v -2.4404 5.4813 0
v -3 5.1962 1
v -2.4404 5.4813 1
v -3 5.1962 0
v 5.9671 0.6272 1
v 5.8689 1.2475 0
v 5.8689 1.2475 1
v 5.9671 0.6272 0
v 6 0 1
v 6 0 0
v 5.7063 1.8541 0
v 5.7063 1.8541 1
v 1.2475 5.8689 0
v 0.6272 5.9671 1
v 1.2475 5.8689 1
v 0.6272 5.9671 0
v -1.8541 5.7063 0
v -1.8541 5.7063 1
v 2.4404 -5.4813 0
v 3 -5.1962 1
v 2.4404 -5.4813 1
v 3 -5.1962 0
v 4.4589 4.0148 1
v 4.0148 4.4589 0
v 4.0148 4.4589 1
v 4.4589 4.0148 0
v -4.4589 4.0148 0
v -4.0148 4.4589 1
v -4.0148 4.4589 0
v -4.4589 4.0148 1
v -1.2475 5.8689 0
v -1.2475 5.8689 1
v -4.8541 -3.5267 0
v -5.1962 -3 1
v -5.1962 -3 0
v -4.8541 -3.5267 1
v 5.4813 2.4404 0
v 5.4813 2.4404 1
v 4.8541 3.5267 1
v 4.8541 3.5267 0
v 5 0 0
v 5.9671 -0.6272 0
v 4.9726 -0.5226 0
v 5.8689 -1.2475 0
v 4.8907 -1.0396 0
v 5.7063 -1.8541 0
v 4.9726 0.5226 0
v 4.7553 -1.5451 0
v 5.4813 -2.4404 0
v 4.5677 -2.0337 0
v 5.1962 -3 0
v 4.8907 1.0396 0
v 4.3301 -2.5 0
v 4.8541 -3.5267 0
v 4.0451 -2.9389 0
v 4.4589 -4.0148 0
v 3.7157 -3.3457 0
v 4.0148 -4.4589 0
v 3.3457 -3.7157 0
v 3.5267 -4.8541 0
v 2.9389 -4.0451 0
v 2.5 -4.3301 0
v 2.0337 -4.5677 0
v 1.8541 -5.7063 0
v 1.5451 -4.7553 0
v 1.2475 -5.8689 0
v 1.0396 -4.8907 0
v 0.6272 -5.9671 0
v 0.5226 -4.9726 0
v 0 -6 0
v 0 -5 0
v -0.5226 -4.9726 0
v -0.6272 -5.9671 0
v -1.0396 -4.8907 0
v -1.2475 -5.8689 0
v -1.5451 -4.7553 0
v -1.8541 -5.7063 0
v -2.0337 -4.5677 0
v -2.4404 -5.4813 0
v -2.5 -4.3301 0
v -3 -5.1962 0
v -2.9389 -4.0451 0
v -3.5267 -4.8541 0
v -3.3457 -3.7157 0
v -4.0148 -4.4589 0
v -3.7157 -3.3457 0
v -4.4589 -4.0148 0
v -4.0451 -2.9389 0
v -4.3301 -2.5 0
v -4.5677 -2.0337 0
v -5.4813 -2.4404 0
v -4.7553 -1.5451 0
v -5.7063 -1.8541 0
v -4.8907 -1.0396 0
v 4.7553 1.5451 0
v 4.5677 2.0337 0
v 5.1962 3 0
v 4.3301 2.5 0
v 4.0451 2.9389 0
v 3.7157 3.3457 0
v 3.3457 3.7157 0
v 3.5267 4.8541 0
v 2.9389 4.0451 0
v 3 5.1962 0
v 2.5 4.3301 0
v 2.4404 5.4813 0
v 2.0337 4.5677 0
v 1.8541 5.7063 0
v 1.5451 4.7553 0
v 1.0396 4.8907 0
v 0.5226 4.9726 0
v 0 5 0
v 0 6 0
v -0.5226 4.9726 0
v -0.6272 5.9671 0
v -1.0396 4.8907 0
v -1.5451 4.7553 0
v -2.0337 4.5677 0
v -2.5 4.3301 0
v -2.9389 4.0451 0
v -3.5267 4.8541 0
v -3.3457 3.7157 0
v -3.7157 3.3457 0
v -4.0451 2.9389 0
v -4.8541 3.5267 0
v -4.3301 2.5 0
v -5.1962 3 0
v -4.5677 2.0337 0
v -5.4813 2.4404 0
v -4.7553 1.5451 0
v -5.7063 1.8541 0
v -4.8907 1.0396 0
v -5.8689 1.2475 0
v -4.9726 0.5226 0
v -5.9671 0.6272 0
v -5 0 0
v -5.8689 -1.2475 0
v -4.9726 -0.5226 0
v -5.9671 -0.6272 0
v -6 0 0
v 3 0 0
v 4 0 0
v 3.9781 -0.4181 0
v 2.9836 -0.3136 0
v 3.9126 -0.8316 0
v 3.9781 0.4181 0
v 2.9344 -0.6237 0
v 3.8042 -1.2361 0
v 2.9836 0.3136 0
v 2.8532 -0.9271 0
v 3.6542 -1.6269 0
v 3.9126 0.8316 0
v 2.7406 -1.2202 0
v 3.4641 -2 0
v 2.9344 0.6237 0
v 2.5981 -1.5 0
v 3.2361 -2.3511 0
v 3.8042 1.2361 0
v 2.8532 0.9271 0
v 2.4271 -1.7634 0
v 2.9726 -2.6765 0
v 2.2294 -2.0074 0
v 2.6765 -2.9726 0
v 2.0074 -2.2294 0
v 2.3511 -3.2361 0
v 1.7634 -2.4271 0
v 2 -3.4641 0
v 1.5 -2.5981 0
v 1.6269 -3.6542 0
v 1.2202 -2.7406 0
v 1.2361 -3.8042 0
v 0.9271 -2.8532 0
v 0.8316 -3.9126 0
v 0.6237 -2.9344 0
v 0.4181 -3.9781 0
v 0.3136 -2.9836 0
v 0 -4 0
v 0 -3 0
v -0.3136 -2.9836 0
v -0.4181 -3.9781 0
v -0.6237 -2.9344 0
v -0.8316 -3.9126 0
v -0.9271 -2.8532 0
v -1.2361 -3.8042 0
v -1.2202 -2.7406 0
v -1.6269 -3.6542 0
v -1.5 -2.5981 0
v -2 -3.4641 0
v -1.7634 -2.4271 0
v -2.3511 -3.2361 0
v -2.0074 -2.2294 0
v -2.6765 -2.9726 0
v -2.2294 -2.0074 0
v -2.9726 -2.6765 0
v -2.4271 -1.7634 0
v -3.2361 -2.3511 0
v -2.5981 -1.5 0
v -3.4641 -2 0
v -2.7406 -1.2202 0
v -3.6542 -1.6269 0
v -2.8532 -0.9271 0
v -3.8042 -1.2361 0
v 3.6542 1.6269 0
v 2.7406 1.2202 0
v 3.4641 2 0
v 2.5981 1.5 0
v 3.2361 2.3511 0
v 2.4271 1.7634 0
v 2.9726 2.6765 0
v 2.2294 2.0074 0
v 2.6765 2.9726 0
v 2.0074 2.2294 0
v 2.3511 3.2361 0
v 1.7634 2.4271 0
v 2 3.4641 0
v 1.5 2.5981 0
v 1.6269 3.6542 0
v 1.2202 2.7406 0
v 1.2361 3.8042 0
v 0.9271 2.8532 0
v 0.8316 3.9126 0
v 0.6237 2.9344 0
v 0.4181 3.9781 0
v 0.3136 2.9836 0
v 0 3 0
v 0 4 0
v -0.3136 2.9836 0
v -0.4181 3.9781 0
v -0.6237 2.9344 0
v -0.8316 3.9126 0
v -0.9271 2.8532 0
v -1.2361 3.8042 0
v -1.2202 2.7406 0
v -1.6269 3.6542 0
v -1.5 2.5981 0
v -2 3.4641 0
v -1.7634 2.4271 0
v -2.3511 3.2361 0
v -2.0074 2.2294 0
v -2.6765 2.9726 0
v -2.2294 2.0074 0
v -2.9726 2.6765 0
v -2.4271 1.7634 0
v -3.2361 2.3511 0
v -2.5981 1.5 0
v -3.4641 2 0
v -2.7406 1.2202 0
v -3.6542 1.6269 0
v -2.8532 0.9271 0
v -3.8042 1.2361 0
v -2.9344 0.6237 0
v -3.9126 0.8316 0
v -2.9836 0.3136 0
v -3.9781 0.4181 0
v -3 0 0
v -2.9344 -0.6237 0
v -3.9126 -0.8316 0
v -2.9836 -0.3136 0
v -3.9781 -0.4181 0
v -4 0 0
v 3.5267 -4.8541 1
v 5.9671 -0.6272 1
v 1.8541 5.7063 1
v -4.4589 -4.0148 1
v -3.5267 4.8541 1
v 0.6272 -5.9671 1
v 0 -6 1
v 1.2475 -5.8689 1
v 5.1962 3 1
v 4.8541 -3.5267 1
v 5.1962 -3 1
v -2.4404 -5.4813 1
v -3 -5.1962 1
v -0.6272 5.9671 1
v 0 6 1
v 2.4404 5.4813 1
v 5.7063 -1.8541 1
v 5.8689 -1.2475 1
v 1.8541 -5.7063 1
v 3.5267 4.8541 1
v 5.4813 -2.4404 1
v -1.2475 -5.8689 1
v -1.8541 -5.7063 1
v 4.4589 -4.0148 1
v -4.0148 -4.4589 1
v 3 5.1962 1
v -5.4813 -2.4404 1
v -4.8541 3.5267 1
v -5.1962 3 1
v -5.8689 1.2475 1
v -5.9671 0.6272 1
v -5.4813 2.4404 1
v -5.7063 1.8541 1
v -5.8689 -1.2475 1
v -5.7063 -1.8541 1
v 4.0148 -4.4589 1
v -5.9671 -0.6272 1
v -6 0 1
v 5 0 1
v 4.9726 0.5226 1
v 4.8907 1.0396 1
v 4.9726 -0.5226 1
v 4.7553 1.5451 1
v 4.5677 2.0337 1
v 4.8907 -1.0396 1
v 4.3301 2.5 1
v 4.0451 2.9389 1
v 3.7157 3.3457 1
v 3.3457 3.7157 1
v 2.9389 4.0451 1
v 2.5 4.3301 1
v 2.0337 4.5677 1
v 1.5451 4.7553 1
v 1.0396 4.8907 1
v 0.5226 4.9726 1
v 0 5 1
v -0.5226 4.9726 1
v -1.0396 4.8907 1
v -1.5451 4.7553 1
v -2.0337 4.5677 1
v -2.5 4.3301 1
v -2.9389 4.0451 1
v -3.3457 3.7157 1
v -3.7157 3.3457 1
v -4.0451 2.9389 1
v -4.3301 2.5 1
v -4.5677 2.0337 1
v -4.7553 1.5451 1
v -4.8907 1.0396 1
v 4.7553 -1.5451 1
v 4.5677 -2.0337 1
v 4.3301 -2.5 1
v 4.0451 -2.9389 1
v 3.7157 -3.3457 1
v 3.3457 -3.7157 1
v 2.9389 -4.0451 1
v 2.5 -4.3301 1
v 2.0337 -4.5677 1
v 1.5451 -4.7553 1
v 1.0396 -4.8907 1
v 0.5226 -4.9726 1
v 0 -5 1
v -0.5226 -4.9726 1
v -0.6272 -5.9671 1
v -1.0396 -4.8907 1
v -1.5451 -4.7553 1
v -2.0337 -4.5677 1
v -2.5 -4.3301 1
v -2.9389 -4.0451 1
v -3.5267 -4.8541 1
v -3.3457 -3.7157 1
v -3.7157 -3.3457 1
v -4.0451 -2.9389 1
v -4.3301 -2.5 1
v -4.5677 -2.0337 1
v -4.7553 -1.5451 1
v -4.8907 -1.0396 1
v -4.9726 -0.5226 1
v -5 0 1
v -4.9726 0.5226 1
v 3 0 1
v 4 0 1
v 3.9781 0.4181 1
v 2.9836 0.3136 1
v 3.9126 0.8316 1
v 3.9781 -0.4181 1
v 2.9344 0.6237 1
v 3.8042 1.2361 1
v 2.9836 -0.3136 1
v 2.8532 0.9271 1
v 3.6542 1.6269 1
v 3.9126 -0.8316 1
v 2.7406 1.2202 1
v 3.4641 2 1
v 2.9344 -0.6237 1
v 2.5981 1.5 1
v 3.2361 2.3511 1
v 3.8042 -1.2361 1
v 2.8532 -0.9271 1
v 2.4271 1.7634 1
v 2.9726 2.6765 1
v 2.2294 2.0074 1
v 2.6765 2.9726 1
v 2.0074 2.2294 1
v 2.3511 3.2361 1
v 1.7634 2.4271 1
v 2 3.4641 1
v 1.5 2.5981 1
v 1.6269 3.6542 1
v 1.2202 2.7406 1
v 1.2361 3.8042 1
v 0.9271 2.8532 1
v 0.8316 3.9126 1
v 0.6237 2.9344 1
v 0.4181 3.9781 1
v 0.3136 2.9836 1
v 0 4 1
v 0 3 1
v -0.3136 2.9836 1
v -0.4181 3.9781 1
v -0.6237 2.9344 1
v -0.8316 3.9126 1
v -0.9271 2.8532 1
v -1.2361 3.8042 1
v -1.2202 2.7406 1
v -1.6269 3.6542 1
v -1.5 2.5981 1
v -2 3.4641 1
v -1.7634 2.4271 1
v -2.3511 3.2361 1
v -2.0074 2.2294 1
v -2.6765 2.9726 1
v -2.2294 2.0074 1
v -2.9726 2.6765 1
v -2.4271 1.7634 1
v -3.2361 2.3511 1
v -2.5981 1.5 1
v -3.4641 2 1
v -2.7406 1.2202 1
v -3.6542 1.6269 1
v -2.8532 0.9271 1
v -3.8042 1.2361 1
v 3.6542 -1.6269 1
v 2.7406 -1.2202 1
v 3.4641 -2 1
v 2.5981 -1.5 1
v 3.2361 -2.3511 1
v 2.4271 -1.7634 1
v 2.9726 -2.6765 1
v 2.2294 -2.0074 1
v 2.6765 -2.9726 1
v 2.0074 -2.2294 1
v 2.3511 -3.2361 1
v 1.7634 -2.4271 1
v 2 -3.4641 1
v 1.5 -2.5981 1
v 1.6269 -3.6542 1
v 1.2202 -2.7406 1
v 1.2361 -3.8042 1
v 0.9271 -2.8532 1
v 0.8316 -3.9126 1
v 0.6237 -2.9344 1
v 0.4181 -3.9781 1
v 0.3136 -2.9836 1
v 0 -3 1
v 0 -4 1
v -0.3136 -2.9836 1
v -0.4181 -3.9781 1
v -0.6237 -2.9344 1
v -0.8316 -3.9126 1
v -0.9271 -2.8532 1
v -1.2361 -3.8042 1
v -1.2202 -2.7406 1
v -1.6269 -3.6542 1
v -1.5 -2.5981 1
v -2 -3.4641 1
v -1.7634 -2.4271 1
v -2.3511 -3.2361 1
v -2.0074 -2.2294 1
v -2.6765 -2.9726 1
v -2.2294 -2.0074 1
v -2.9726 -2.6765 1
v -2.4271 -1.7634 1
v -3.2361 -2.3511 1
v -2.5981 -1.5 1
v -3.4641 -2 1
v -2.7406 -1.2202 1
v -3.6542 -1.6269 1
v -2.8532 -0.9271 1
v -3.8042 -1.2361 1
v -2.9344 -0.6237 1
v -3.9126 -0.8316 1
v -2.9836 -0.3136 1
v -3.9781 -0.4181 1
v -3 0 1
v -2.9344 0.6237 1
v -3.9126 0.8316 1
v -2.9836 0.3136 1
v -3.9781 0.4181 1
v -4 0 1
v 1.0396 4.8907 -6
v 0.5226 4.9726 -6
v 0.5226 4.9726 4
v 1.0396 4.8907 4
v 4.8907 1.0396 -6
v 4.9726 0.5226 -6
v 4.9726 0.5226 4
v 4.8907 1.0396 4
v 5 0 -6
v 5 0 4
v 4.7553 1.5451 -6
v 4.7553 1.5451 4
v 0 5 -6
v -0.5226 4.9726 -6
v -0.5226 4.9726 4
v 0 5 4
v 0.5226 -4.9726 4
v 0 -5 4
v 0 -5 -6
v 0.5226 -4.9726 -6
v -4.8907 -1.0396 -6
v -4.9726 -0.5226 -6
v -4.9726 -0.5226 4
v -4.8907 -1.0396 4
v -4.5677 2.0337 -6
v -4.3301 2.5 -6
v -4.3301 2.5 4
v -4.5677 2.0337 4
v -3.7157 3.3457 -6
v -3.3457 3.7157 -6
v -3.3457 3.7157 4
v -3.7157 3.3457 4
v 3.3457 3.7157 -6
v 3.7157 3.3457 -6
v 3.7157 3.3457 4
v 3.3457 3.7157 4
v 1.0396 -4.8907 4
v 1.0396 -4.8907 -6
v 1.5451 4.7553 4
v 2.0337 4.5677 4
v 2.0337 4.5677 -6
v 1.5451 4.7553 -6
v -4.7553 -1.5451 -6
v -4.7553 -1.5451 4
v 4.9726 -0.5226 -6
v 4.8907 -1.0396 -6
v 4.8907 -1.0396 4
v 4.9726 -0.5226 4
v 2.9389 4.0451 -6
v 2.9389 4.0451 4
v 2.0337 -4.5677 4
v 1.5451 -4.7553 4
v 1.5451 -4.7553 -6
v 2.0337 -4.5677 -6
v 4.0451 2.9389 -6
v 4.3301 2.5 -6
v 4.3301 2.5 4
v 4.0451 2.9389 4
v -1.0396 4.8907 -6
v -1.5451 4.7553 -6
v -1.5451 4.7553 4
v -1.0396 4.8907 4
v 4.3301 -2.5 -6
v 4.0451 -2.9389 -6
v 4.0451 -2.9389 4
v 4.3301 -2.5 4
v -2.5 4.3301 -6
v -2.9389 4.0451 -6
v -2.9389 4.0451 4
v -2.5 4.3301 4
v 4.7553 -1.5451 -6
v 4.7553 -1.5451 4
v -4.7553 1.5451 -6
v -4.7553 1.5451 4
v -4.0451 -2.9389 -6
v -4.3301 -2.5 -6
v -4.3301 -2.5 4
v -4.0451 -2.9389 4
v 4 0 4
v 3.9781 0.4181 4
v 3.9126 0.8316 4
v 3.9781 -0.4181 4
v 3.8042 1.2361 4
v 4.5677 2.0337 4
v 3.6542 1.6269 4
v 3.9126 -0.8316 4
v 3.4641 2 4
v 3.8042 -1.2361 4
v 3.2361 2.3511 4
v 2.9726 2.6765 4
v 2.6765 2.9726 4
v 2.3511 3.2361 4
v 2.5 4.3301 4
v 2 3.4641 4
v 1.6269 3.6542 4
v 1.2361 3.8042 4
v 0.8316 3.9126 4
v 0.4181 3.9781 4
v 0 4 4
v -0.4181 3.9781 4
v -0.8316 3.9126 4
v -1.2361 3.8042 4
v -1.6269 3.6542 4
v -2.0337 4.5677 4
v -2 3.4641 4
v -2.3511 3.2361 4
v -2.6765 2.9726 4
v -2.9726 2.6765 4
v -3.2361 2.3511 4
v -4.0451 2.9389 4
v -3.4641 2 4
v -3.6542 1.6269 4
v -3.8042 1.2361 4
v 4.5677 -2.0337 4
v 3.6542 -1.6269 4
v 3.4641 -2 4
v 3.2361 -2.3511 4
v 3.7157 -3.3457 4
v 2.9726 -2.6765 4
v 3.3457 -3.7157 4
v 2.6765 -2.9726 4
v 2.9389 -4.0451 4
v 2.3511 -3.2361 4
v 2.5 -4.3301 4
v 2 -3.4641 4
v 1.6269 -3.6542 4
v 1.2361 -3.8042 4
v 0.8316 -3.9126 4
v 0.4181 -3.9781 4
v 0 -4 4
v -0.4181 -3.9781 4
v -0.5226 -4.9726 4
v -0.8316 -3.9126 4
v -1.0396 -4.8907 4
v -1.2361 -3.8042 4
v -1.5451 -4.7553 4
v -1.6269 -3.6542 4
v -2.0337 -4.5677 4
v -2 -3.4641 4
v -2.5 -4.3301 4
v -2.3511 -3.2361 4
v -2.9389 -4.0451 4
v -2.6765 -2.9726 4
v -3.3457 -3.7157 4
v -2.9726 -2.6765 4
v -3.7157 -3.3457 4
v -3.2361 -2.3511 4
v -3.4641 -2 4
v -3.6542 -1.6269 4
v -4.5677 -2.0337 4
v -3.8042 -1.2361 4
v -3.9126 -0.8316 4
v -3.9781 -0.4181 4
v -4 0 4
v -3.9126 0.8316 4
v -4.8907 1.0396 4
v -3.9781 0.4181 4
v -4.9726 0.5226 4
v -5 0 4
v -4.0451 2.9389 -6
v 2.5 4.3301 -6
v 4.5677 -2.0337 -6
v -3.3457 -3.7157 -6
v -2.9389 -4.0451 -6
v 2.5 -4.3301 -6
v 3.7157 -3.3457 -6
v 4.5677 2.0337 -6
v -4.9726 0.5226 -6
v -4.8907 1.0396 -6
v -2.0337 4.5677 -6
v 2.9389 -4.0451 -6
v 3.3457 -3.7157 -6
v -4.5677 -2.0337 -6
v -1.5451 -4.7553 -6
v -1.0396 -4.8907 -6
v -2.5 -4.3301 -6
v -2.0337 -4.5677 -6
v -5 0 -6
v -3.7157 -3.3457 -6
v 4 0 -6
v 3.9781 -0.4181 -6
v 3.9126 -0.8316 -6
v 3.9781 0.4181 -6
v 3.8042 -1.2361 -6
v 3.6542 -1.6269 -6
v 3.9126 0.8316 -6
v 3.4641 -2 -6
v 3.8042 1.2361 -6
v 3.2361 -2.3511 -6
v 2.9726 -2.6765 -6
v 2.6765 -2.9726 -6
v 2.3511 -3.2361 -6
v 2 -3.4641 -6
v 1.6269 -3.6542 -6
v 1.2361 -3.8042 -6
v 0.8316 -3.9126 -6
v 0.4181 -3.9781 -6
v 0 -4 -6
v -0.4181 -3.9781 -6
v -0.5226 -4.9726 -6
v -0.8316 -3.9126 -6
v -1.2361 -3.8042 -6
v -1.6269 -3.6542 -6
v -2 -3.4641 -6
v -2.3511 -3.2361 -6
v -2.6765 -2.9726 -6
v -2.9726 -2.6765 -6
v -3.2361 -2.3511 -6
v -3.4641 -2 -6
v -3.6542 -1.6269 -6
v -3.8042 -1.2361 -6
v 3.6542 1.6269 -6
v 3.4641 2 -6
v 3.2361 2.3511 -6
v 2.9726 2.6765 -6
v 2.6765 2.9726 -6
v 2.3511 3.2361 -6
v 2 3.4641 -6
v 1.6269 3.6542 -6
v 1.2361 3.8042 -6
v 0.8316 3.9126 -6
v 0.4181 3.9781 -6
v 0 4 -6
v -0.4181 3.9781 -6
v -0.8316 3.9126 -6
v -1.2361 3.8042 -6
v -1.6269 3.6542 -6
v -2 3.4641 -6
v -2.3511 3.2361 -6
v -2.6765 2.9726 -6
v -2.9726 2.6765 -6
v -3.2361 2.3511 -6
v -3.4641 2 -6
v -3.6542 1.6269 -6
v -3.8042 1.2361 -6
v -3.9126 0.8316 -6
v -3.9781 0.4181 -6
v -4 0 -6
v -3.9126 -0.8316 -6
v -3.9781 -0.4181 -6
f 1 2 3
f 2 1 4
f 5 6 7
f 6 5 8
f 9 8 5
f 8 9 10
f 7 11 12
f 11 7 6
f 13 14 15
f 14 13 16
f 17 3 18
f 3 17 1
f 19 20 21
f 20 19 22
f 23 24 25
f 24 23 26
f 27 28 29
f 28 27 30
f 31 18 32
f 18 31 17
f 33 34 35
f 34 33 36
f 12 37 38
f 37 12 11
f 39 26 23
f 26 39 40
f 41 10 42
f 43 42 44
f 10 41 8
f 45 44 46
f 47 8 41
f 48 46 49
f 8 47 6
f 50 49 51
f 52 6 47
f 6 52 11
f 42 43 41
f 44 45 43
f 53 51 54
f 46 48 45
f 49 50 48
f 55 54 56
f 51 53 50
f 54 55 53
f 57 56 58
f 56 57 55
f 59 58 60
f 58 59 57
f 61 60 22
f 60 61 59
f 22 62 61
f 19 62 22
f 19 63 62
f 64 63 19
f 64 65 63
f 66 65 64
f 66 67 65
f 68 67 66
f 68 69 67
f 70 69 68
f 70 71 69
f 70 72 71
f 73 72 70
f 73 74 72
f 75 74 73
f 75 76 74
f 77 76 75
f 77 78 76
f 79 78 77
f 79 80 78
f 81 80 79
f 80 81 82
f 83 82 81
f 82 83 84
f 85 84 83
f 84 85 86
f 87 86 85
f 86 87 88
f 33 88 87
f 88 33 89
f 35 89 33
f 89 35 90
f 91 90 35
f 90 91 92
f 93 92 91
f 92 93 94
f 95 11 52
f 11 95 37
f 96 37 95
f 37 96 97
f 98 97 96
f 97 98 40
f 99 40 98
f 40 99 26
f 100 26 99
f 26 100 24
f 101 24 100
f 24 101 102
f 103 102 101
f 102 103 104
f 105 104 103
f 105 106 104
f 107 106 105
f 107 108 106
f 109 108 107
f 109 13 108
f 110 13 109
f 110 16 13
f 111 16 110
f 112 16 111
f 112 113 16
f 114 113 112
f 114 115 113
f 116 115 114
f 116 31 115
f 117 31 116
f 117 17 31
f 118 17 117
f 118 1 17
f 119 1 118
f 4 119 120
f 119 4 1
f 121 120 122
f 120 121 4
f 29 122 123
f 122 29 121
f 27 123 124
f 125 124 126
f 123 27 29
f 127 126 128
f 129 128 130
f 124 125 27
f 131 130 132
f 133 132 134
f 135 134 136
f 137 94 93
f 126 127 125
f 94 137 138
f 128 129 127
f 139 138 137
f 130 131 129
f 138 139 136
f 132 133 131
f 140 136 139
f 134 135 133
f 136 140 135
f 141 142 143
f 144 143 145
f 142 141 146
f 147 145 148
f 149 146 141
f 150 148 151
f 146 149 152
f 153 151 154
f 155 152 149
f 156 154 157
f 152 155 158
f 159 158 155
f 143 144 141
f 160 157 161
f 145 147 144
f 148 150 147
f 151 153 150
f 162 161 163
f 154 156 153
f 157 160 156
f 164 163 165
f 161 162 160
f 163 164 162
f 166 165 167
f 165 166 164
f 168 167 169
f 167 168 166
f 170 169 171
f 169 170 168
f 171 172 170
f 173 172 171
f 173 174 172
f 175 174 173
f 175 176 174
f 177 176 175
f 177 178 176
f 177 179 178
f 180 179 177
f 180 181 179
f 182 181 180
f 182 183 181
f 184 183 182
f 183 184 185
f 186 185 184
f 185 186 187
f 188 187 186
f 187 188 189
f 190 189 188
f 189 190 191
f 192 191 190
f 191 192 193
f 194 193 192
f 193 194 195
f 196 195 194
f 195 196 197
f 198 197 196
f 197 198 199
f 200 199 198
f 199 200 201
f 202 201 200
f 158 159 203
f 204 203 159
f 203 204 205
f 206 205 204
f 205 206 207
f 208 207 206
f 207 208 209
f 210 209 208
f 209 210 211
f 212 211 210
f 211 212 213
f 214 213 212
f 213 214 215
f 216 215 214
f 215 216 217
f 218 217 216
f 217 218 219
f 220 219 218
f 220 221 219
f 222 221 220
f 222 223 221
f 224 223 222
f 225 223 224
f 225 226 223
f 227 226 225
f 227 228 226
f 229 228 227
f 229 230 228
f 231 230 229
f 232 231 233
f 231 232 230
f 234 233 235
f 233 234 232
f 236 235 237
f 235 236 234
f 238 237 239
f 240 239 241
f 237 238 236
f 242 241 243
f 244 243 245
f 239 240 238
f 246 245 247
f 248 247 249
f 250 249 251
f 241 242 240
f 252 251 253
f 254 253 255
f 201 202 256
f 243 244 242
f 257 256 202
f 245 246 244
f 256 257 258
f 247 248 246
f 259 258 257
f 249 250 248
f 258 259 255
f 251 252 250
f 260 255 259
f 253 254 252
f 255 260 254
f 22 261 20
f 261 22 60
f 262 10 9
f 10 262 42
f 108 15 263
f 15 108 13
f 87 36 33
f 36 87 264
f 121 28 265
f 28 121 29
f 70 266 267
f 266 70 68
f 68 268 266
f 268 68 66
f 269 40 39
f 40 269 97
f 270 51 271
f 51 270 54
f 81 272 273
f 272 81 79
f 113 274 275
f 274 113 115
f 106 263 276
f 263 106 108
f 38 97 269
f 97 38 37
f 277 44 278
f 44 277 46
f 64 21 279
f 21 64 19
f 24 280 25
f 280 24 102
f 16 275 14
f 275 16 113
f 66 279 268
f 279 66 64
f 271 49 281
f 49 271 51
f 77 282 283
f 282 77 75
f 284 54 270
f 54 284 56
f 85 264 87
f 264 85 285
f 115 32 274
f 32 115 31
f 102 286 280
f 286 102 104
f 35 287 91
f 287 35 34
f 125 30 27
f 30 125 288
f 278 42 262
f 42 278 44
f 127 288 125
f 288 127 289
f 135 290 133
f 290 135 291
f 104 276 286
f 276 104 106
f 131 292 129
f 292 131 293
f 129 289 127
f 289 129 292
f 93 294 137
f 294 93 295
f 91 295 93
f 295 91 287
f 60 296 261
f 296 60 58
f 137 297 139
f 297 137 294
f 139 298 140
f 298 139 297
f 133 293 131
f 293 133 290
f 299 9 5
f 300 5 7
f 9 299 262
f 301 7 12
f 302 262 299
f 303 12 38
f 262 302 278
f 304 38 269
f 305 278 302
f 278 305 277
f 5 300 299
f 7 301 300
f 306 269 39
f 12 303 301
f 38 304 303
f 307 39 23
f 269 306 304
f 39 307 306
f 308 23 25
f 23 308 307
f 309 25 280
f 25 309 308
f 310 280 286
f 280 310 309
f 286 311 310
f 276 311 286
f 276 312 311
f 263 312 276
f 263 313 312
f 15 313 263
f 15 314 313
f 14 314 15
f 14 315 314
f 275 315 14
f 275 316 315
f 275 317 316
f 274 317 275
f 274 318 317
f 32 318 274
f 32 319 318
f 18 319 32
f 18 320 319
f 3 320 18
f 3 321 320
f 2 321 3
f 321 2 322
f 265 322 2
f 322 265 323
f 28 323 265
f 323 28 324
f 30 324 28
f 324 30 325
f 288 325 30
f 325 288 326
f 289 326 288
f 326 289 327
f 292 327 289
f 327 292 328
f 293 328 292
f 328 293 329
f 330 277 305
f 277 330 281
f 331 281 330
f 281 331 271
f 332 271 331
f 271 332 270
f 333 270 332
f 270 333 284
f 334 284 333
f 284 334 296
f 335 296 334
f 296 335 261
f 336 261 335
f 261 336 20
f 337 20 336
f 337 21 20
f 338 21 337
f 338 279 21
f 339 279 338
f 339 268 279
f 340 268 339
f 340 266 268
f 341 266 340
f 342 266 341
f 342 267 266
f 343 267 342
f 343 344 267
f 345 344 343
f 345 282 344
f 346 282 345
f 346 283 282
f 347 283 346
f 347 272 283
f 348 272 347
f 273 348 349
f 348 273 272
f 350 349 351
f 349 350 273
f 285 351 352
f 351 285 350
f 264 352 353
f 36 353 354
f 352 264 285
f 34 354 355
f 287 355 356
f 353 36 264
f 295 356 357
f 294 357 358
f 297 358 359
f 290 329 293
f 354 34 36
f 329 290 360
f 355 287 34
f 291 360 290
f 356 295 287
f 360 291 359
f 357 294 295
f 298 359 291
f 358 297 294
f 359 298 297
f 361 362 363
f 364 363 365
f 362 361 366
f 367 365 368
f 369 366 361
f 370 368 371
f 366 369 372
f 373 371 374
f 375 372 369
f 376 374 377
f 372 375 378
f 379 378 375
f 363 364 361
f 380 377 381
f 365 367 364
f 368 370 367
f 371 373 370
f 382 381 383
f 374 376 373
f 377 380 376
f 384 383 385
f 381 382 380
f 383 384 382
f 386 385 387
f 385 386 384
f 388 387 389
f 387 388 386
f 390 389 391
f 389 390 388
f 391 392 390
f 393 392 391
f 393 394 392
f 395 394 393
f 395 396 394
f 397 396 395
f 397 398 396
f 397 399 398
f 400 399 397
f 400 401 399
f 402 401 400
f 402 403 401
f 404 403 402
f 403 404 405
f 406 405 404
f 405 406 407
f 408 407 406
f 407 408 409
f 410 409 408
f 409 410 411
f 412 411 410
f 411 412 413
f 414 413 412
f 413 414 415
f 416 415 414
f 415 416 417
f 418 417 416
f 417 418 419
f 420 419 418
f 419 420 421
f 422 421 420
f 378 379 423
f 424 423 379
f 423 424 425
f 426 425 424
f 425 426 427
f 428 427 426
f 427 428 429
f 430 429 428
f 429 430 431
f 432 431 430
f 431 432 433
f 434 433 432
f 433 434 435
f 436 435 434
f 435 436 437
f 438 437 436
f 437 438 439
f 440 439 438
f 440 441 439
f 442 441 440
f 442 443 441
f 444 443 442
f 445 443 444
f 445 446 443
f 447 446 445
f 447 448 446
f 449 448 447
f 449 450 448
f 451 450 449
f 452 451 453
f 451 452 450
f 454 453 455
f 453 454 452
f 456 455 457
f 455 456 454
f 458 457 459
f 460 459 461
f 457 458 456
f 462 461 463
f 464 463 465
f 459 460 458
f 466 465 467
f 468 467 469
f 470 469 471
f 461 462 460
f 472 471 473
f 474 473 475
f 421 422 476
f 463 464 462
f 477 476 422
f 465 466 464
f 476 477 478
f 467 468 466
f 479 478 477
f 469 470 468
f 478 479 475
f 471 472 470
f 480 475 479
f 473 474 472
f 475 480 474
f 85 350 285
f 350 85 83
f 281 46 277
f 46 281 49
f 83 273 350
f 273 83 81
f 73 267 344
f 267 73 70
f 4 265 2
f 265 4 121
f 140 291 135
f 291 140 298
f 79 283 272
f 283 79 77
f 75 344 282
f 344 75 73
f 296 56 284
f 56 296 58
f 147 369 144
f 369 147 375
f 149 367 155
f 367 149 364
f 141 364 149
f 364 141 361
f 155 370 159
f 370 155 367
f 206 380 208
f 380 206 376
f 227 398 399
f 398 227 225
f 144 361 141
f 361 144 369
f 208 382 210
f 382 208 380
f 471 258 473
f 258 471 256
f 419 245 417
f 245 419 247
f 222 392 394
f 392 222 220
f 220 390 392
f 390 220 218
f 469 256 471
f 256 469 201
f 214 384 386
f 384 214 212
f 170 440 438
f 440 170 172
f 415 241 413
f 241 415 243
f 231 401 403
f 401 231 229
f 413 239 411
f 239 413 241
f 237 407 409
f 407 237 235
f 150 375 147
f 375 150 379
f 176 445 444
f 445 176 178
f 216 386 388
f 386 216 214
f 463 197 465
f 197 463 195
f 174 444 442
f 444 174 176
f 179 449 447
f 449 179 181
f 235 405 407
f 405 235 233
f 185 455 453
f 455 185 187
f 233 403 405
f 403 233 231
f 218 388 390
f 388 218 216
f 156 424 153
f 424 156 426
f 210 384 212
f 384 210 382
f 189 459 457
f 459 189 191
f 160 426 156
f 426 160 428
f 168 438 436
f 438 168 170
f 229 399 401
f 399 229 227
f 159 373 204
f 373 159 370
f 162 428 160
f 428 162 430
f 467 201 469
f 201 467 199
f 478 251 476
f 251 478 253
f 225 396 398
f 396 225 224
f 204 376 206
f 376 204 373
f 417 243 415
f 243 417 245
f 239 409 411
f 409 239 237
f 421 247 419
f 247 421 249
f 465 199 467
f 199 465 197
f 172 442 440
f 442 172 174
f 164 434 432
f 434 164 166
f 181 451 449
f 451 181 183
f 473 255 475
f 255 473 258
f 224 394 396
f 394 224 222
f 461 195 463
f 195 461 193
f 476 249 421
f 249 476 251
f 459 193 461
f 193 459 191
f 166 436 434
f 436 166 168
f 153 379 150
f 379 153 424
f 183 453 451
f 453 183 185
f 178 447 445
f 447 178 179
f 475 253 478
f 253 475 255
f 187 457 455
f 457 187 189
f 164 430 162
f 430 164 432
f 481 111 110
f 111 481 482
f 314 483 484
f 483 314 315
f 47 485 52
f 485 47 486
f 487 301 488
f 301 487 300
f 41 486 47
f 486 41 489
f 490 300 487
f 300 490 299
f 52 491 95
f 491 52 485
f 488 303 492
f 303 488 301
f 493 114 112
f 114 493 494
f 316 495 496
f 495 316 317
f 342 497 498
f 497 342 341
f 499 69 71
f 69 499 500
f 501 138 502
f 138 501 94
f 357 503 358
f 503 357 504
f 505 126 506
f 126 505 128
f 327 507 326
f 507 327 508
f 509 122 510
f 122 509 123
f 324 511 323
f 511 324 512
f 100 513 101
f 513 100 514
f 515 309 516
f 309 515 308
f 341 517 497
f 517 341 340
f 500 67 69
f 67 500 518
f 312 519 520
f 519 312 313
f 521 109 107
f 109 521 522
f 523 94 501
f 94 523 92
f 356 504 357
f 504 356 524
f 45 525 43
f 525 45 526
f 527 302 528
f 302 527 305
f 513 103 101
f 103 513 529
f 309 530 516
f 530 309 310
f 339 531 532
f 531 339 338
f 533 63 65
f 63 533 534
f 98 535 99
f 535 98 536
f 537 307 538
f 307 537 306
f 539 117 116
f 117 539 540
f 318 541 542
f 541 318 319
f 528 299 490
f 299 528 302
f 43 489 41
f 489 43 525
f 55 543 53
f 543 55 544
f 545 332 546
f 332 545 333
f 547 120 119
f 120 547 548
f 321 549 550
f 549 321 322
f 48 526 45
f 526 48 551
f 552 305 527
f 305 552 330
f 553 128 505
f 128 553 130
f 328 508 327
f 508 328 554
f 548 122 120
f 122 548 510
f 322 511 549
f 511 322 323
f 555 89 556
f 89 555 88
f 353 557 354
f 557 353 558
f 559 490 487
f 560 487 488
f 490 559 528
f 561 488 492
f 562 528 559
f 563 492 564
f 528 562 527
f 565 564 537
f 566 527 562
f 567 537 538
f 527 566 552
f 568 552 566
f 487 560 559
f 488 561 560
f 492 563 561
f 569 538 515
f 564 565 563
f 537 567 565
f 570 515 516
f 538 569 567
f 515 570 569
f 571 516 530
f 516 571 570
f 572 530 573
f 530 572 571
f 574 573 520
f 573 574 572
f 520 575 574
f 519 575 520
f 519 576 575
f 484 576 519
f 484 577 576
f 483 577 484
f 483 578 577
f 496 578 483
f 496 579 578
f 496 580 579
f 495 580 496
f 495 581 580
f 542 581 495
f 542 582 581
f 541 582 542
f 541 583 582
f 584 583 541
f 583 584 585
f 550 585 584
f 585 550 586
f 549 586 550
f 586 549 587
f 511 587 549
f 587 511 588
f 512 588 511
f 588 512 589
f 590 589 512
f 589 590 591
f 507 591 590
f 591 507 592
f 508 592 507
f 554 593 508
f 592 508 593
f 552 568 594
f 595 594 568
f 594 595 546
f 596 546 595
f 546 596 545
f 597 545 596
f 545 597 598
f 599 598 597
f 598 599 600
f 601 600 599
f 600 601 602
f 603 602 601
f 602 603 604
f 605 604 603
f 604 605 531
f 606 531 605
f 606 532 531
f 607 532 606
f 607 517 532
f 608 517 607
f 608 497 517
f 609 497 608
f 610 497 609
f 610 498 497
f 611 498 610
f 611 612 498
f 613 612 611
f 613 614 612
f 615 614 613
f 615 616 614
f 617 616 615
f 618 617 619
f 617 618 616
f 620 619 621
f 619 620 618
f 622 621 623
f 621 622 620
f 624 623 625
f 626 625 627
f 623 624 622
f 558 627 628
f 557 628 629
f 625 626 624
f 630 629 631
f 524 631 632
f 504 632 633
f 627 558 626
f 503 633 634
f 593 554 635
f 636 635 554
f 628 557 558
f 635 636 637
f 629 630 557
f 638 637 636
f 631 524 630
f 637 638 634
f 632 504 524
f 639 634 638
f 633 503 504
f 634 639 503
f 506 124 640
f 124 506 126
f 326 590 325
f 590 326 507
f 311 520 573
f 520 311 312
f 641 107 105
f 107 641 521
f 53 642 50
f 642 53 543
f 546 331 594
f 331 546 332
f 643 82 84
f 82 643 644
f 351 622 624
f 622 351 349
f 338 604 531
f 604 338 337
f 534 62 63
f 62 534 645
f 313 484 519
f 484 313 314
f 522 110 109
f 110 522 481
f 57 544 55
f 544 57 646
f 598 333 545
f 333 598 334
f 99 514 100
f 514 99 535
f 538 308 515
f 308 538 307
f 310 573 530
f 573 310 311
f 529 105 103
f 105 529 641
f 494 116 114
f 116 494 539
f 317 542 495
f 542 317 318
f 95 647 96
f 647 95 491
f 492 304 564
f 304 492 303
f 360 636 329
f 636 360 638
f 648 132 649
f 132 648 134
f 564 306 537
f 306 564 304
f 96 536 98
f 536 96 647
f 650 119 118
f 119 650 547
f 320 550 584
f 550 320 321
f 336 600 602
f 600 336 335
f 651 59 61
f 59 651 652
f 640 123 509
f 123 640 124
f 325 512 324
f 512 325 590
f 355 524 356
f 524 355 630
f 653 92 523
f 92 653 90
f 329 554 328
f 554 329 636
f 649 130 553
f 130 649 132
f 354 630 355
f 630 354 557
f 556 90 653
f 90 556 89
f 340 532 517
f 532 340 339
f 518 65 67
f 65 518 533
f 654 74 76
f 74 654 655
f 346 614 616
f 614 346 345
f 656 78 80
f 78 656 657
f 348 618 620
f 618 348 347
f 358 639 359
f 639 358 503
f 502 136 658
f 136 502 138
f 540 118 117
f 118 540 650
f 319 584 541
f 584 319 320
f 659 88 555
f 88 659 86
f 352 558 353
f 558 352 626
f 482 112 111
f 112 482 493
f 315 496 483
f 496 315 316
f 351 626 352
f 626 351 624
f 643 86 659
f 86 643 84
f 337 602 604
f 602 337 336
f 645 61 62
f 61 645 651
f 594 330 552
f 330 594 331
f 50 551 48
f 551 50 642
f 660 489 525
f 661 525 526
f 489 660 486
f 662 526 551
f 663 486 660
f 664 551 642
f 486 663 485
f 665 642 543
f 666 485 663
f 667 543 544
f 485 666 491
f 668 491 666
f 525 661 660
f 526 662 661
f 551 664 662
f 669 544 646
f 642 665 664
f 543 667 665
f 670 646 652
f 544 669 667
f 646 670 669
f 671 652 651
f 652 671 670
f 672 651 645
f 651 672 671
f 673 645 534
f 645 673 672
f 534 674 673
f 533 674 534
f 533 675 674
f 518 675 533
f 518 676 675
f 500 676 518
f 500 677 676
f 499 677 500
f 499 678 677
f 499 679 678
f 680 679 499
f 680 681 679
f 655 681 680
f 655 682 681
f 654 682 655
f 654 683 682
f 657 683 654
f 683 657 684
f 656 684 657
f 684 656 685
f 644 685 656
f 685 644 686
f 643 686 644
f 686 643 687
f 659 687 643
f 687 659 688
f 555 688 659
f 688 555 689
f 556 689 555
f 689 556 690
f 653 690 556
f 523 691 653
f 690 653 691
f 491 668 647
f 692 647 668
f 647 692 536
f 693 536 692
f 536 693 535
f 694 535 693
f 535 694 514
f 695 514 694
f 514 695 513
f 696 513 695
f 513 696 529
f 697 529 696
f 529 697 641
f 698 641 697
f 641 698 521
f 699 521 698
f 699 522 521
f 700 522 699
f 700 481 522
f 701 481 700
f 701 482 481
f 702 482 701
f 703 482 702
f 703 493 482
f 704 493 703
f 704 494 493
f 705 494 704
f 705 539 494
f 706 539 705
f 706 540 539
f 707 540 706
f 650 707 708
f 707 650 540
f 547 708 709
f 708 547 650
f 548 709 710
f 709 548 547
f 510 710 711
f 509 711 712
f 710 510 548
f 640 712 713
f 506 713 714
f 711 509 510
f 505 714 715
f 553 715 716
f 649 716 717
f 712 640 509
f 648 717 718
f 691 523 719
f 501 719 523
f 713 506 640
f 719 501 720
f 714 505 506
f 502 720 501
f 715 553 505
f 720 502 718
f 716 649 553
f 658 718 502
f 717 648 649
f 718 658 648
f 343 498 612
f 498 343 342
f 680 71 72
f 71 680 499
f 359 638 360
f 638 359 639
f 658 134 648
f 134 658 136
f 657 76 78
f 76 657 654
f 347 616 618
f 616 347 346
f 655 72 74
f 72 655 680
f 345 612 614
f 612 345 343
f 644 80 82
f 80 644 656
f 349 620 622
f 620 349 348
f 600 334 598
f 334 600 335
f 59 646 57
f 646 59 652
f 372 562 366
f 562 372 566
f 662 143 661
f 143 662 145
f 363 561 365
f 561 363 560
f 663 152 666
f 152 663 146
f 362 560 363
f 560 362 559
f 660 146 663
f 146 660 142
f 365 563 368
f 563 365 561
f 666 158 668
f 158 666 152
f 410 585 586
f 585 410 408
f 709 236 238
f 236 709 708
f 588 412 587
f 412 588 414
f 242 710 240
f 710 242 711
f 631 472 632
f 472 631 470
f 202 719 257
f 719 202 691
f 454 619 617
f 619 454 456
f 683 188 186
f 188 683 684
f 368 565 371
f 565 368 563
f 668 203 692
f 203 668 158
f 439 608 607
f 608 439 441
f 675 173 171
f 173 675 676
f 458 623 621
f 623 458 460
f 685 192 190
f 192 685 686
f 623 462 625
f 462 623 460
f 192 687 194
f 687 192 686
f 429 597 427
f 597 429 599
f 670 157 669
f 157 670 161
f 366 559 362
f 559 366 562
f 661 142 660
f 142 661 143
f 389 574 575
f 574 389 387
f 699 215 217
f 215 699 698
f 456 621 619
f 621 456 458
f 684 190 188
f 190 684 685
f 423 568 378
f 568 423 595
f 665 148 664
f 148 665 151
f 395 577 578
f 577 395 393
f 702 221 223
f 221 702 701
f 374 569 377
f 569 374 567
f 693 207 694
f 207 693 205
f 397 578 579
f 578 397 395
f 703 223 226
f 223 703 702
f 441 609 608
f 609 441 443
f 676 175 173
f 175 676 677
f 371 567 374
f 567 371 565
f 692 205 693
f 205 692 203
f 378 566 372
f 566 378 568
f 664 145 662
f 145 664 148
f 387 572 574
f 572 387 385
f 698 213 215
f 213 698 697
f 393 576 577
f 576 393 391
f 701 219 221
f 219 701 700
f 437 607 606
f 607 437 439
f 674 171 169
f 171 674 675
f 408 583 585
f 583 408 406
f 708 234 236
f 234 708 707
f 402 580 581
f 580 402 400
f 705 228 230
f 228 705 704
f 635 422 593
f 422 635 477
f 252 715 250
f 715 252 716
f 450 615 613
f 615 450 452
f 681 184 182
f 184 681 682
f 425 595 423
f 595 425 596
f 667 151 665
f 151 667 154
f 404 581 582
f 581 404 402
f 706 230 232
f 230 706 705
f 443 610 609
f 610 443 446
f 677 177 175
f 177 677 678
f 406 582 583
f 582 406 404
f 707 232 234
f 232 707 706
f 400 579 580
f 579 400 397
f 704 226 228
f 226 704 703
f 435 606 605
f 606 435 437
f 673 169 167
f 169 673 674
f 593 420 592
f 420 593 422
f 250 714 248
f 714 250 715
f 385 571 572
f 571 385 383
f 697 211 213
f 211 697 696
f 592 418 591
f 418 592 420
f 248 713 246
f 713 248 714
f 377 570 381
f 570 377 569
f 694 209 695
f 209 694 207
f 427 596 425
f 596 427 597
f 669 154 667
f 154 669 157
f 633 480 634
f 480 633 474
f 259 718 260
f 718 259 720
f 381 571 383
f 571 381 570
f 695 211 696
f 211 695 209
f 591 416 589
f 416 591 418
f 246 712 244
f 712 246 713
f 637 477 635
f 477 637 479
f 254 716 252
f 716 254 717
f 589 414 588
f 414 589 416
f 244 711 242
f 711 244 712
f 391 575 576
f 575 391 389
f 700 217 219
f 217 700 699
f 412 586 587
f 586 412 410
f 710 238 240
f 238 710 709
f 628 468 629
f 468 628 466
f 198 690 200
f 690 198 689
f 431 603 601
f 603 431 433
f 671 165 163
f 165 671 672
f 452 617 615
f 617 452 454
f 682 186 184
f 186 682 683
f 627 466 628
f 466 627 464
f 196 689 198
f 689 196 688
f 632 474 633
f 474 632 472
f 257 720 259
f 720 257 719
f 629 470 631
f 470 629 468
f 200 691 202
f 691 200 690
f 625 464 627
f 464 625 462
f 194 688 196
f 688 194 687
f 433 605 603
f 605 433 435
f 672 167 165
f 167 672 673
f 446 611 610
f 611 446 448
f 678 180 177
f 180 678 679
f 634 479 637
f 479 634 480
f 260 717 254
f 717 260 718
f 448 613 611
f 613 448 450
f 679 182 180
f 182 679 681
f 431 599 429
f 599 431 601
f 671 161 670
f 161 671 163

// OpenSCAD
// inner diameter
solidInner = 6;

// outer diameter
solidOuter = 12;

// thickness
solidThickness = 1;

// inner diameter
hollowInner = 8;

// outer diameter
hollowOuter = 10;

// thickness
hollowThickness = 10;

// offset
offset = -6;



module washer (inner, outer, thickness) {

    difference() {
        cylinder(d=outer, h=thickness, $fn=60);
        translate([0,0,-thickness])
        cylinder(d=inner, h=thickness*3, $fn=60);
    };
}

union() {
    washer (solidInner, solidOuter, solidThickness);
    translate ([0,0,offset]) washer (hollowInner, hollowOuter, hollowThickness);
}
